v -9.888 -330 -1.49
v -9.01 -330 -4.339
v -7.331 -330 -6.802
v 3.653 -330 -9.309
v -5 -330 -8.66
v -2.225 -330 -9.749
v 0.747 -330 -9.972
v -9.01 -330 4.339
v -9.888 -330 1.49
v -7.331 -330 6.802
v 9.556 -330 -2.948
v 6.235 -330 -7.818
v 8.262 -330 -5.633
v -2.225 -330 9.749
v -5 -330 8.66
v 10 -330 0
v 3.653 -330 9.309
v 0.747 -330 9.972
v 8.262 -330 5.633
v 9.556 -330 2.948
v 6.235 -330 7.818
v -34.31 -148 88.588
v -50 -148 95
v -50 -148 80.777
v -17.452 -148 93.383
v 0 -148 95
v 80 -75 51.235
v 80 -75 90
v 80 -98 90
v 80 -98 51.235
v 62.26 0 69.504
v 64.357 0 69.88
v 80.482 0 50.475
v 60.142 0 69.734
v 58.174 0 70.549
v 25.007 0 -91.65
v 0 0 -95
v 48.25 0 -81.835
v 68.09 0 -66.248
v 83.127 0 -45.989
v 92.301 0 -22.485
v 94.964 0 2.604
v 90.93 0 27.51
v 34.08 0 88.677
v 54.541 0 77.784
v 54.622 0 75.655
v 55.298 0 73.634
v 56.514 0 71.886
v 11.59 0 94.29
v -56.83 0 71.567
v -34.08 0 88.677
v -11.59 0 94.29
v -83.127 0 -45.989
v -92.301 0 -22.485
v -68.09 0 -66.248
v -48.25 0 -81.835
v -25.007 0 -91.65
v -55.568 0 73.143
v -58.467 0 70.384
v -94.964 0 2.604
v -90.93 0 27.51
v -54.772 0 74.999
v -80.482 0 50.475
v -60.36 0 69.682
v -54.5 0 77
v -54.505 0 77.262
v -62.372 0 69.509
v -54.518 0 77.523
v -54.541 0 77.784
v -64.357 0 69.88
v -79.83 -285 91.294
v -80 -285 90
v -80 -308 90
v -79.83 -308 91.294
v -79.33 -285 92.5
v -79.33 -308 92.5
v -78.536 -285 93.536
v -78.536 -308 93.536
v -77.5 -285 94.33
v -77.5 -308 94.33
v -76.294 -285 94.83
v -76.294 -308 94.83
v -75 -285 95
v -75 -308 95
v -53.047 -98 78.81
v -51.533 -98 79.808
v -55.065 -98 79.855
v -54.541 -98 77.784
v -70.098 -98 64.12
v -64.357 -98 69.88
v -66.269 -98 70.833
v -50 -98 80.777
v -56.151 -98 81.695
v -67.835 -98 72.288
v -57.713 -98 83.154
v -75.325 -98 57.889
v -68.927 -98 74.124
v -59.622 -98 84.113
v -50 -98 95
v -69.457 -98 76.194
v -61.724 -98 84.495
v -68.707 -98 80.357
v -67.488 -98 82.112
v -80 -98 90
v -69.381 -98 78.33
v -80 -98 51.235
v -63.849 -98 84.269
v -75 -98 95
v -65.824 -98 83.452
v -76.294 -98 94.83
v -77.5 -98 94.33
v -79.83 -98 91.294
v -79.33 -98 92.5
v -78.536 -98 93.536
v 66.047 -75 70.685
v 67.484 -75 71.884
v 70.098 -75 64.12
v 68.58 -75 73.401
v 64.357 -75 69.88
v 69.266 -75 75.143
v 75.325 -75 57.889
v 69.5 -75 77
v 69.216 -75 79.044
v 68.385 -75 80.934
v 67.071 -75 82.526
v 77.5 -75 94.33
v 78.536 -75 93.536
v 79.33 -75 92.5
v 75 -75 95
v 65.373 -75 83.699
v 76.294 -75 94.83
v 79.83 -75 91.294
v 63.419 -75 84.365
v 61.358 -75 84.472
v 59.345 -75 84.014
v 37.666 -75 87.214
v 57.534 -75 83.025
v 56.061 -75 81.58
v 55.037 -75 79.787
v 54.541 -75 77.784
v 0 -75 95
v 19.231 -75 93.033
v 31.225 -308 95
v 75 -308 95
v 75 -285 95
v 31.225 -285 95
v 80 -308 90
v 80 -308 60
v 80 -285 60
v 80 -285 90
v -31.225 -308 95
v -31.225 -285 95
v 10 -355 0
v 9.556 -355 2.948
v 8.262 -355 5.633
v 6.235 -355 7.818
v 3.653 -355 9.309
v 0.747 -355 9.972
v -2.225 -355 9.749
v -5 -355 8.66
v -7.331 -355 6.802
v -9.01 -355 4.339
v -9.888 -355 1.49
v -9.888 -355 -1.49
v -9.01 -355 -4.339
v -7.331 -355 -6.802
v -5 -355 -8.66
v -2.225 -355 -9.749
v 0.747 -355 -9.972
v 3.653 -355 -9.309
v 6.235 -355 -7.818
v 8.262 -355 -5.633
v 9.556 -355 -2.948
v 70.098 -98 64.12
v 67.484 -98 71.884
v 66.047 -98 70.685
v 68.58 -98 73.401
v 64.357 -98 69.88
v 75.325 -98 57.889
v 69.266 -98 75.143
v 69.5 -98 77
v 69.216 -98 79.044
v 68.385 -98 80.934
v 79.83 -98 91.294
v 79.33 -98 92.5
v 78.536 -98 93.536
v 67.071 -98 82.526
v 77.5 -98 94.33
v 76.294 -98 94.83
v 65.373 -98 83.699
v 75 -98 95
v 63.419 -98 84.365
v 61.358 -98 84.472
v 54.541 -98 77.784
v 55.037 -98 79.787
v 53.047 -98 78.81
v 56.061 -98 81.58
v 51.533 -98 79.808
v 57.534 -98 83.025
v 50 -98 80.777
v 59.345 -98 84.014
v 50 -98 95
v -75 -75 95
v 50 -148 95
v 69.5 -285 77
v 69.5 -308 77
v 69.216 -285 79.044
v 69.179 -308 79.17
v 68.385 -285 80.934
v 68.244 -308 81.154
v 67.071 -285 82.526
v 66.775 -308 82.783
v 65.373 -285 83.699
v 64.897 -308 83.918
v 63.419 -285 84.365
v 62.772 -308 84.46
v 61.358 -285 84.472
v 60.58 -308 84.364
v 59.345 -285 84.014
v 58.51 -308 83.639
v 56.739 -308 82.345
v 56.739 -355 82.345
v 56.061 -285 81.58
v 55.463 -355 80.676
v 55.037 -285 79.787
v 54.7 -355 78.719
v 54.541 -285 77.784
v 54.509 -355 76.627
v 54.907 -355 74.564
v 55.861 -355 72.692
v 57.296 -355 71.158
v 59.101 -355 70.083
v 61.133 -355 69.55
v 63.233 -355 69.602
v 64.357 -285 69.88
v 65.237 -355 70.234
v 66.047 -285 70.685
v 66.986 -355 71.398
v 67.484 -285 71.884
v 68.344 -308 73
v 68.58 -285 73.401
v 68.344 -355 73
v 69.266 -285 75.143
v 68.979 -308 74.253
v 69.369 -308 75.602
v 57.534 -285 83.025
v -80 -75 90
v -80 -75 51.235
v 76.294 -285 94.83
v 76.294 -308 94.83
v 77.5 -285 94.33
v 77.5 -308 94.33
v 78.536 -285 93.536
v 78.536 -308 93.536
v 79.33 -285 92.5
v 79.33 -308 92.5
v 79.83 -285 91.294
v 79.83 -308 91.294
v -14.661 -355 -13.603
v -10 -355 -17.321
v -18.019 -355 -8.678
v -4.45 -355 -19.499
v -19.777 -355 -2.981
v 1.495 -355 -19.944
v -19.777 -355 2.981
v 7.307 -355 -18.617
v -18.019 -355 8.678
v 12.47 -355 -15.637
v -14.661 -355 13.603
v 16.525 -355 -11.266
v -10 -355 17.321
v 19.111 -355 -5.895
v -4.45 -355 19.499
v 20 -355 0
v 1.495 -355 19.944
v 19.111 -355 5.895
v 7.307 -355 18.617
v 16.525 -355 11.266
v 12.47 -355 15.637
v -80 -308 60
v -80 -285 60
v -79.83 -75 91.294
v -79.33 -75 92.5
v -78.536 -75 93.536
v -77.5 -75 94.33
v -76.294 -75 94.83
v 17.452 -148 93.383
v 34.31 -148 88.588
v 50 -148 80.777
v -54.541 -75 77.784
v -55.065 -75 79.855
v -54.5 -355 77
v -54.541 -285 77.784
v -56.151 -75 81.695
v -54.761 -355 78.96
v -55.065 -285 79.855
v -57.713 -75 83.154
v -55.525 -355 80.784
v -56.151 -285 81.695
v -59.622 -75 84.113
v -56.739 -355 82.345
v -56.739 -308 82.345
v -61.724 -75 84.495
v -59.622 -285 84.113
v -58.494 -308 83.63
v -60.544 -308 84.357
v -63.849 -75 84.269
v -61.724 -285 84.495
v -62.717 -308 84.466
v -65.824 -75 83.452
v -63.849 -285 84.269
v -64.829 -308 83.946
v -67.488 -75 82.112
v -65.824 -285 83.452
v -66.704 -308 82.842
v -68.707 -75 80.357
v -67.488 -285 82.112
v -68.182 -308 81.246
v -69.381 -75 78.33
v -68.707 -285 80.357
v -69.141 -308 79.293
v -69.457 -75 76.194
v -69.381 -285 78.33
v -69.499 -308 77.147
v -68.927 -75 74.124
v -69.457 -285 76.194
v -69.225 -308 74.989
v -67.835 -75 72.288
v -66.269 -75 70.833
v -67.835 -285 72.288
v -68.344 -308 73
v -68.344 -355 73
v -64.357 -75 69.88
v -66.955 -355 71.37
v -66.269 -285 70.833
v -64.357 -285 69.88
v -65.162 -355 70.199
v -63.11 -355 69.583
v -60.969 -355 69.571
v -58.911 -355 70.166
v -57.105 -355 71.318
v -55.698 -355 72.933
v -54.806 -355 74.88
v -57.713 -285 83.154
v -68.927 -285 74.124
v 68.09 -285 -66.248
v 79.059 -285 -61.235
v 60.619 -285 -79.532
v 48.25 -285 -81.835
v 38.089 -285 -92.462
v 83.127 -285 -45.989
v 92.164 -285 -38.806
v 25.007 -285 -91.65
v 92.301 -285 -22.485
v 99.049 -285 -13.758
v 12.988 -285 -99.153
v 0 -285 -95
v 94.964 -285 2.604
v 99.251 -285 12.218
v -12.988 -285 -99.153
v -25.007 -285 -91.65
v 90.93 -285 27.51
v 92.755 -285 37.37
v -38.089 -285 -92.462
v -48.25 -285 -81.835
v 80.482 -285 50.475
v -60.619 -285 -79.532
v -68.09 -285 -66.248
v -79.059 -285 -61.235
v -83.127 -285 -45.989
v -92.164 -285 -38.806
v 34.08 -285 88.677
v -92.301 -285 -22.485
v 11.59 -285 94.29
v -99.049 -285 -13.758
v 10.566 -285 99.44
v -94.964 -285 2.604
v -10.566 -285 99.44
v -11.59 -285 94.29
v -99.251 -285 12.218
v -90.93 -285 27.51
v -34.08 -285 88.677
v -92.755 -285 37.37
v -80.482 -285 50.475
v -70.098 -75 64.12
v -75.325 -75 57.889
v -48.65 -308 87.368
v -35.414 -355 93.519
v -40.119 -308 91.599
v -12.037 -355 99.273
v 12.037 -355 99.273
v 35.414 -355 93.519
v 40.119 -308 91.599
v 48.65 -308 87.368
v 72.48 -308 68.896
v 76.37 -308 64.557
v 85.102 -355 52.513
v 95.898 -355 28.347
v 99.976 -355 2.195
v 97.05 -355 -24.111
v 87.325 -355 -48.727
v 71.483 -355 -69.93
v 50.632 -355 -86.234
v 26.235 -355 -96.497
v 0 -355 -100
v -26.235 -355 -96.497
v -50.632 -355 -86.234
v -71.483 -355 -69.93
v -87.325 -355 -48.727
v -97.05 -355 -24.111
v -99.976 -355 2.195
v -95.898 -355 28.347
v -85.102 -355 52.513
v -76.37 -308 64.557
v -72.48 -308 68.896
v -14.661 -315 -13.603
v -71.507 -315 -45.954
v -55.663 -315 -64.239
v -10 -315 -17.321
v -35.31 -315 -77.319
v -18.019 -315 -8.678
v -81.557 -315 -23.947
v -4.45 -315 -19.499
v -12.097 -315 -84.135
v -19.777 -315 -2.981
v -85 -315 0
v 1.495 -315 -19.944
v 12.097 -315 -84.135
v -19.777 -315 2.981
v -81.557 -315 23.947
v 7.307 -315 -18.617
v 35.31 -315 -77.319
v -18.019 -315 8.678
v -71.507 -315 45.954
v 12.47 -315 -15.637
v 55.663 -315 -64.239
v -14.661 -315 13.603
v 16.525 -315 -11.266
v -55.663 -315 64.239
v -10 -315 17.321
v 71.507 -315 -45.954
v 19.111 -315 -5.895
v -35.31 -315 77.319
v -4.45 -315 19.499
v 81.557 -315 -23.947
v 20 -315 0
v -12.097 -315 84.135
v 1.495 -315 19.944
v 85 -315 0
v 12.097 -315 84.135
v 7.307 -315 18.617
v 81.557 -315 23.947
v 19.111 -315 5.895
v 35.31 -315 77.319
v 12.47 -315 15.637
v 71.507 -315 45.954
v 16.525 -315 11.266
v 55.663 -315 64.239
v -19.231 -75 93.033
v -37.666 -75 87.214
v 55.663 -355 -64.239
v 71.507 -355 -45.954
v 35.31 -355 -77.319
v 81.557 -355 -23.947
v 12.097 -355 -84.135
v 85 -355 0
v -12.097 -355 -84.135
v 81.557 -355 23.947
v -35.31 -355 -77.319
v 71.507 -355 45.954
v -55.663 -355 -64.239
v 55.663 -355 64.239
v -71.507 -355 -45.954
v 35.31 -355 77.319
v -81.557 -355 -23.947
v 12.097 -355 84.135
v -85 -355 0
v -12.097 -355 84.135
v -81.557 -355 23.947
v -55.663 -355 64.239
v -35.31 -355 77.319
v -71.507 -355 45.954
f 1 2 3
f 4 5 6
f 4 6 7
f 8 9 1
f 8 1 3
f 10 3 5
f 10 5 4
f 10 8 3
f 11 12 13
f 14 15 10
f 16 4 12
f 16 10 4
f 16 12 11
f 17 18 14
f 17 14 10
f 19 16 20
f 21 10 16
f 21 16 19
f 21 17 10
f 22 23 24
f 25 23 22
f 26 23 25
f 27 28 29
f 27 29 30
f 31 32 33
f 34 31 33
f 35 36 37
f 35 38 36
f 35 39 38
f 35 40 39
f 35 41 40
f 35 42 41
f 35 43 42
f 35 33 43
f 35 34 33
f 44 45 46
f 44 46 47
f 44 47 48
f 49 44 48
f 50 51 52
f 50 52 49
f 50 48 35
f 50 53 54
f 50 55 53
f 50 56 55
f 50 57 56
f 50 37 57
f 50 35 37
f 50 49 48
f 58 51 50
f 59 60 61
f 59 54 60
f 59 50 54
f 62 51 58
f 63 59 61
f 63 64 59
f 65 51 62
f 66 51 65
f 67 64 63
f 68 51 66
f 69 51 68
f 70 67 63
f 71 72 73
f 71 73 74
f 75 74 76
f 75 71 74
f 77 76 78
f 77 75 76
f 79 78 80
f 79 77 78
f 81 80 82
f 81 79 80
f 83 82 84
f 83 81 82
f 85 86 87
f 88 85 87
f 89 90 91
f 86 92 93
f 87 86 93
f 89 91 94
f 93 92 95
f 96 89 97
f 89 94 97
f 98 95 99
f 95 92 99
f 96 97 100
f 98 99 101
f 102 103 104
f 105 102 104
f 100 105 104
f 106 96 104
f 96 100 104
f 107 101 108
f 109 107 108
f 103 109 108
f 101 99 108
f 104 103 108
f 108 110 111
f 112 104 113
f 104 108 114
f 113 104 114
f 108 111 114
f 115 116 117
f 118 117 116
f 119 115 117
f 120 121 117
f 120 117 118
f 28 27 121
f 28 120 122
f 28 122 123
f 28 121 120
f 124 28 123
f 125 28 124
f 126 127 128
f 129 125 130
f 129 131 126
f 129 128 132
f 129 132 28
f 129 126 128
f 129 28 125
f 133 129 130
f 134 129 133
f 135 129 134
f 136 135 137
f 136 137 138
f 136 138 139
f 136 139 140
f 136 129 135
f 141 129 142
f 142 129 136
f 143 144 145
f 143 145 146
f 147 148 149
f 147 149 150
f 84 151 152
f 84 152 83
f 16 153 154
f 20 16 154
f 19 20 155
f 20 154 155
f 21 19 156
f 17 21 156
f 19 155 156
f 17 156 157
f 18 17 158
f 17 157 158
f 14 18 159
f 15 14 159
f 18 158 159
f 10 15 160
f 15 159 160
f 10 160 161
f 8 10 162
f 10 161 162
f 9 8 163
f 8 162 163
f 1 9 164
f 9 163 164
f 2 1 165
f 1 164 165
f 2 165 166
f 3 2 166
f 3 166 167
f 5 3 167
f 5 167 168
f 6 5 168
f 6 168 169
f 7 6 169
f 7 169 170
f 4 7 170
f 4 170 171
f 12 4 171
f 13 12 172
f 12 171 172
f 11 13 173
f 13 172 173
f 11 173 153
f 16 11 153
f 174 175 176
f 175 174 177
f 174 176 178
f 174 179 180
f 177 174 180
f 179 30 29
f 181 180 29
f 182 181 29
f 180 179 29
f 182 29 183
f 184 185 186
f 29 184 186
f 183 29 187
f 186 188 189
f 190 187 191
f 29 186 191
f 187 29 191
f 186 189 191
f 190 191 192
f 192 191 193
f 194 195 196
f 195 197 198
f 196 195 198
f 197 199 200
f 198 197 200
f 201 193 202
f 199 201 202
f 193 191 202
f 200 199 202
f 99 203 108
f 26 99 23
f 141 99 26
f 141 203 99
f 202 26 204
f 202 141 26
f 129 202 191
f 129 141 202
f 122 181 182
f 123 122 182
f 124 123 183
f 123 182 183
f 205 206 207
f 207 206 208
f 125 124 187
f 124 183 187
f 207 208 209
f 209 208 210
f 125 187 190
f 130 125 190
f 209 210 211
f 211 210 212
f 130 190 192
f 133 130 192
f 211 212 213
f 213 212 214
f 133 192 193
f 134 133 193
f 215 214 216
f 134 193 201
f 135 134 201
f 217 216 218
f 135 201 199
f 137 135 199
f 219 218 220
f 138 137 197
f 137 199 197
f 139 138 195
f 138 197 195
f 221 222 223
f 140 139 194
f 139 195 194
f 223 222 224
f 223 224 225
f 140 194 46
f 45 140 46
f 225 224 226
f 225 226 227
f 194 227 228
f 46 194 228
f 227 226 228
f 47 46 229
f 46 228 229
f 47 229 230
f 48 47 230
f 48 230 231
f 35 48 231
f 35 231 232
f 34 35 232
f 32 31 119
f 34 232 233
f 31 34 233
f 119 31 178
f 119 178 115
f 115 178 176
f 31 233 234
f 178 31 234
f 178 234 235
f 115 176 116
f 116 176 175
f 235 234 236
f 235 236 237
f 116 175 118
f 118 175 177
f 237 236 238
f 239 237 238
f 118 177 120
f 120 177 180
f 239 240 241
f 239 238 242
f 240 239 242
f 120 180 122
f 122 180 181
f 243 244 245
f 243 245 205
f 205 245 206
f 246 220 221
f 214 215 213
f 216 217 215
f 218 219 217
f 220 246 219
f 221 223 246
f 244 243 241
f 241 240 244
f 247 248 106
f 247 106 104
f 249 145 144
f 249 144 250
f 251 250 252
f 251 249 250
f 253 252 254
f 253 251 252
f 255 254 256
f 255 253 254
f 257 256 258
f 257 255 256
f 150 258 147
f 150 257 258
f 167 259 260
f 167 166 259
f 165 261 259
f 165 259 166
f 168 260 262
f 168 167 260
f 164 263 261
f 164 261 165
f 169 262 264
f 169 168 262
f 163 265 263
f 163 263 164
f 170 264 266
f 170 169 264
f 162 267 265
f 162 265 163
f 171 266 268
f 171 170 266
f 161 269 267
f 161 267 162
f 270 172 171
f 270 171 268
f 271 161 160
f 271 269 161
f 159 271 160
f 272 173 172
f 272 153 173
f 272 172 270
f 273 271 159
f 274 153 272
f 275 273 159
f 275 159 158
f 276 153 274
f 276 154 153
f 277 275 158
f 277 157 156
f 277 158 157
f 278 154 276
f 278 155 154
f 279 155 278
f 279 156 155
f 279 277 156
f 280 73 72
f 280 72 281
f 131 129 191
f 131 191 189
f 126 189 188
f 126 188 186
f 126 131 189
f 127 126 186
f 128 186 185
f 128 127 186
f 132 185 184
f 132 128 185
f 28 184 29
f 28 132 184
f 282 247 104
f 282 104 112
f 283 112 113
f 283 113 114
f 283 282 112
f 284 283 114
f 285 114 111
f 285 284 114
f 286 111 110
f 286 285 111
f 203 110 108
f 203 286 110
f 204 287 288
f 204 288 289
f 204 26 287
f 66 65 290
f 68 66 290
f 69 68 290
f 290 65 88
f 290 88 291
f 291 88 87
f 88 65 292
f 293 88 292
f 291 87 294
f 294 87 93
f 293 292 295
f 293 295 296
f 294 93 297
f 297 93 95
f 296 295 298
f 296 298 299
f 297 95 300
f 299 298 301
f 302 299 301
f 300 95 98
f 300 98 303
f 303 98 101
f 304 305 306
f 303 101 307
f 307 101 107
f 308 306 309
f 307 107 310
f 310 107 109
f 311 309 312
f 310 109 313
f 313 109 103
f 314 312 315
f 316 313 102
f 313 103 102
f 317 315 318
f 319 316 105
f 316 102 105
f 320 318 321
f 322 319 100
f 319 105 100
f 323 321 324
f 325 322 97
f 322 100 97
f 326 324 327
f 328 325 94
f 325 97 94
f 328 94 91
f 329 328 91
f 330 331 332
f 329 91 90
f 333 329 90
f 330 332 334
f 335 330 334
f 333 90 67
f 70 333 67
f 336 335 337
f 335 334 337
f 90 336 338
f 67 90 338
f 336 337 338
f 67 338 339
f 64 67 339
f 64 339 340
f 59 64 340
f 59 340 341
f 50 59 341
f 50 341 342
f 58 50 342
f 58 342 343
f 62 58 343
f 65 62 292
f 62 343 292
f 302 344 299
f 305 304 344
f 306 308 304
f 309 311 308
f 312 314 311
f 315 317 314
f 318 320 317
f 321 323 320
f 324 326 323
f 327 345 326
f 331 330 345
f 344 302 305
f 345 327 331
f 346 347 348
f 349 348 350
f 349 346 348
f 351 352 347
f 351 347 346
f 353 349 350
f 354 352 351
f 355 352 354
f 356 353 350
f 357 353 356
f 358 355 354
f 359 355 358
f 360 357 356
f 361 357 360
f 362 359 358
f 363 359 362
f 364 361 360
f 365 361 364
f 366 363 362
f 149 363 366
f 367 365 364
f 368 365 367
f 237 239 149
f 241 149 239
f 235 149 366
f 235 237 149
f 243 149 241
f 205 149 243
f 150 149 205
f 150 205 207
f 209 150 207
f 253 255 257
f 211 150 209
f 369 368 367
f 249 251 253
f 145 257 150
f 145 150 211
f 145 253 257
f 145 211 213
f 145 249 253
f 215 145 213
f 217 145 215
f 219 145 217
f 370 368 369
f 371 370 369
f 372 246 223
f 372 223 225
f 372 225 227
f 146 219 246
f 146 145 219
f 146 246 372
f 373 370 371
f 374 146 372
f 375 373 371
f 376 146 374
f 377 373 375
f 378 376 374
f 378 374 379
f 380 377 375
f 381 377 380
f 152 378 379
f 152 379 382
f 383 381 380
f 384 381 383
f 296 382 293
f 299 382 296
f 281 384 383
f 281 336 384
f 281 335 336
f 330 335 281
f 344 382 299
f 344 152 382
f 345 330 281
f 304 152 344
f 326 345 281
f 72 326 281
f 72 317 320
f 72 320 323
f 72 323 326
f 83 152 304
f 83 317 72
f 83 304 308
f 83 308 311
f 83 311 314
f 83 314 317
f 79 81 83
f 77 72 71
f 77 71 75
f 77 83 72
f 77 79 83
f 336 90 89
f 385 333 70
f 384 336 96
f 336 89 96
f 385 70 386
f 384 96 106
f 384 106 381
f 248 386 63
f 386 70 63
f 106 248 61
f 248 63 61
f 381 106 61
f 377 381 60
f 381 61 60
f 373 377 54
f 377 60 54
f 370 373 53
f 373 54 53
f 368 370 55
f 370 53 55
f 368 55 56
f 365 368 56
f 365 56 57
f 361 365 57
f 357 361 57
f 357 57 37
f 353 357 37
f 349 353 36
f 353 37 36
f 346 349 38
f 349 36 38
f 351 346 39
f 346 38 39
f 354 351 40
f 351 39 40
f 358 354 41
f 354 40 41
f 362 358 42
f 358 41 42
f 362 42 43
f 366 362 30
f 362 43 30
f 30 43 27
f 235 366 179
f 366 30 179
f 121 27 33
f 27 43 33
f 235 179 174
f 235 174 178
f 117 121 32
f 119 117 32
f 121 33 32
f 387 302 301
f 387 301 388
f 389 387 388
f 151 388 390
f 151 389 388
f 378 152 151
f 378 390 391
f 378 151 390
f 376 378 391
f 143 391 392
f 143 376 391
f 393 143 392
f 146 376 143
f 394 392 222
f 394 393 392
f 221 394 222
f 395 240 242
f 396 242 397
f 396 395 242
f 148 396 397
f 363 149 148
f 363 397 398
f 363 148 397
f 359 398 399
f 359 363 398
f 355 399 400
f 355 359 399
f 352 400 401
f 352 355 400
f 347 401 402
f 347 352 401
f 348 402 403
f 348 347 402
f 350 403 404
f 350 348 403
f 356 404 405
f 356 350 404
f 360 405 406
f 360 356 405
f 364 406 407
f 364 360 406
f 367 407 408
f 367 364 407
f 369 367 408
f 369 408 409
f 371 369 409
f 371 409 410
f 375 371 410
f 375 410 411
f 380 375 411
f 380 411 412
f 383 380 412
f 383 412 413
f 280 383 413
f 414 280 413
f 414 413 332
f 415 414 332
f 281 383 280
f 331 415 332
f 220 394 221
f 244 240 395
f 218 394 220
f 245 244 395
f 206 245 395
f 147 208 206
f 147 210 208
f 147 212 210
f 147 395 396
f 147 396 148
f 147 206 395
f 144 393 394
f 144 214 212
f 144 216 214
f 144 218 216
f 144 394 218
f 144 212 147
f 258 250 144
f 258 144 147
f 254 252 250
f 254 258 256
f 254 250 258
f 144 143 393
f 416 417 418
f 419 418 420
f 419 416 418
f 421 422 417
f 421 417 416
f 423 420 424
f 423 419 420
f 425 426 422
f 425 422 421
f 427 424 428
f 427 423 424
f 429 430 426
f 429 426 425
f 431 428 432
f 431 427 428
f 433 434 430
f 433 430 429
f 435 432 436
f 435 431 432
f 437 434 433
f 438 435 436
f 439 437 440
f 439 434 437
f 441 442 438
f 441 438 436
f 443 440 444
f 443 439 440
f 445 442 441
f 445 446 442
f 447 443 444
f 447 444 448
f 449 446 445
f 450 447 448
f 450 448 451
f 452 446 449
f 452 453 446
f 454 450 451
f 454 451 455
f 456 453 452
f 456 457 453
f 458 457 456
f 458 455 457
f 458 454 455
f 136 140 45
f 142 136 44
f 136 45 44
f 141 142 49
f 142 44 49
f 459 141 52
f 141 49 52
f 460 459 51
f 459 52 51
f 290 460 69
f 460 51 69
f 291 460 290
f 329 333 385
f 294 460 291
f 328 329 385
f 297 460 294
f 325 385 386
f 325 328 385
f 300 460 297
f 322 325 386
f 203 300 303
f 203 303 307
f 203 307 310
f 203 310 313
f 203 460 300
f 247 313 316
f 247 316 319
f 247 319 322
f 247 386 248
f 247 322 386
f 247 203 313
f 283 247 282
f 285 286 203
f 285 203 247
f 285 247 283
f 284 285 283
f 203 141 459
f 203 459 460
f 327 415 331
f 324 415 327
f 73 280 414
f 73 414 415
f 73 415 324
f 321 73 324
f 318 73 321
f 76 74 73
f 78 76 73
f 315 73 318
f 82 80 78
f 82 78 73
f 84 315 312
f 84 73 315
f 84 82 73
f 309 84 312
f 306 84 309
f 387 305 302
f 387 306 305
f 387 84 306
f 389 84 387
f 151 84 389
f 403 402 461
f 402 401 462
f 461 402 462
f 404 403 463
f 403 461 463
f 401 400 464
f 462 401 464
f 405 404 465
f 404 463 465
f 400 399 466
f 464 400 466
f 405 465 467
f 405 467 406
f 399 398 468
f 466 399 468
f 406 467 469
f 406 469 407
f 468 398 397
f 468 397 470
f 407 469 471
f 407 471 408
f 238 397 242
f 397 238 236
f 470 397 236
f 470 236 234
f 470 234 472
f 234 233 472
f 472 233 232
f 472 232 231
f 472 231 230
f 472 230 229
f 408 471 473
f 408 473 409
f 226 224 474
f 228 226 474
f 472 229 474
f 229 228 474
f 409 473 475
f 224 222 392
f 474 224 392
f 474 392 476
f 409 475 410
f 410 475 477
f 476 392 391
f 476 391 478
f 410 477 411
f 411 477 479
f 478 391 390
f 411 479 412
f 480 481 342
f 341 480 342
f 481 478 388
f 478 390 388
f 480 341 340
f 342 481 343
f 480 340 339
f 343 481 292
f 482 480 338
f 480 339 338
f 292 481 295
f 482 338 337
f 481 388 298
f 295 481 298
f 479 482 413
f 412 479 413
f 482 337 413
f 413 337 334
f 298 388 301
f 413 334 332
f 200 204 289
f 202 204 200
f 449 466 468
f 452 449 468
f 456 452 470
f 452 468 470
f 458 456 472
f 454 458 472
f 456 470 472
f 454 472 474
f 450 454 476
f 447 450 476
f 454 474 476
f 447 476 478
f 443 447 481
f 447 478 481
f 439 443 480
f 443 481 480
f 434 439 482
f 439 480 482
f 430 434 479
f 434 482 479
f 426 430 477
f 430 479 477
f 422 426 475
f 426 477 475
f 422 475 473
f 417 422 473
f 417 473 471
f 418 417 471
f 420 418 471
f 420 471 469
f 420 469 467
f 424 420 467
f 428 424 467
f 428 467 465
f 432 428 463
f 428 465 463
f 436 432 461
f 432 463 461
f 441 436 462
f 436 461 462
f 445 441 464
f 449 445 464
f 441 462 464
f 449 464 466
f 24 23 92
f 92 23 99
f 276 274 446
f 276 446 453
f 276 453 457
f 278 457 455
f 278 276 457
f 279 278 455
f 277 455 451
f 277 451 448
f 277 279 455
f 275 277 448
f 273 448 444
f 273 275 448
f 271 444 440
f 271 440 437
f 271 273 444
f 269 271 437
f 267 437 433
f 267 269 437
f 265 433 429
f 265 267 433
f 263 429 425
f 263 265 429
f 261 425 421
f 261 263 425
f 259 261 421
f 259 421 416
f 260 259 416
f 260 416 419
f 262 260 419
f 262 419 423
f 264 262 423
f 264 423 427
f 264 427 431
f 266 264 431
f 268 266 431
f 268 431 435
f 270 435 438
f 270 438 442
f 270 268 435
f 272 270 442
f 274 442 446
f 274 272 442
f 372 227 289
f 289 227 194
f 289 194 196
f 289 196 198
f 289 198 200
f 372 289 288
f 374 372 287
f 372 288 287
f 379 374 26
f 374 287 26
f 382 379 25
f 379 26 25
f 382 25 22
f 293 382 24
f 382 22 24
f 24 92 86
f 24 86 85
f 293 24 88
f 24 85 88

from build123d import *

# Parameters (mm, degrees)
F0_R      = 95
F1_DEPTH  = 355
F3_DEPTH  = 70
F4_R      = 85
F4_R_2    = 20
F5_DEPTH  = 40
F6_R      = 10
F7_DEPTH  = 25
F10_DEPTH = 98
F11_R     = 100
F11_R_2   = 95
F12_DEPTH = 70
F8_R      = 7.5
F13_DEPTH = 500
F14_R     = 5
F16_DEPTH = 47
F18_DEPTH = 75
F19_W     = 100
F19_H     = 50
F20_DEPTH = 22


# Not quite as in the source:
# - a feature names something its author has since deleted; it is built from what else it names


with BuildPart() as f1:
    # F0 (on Front) → F1 (new body)
    with BuildSketch(Plane.XZ):
        Circle(F0_R)
    extrude(amount=F1_DEPTH)

    # F2 (on face) → F3 (join)
    with BuildSketch(Plane.XZ.offset(355)):
        with BuildLine():
            Line((80, 51.2347538298), (80, 95))
            Line((80, 95), (46.4354390525, 95))
            Line((46.4354390525, 95), (0, 95))
            ThreePointArc((0, 95), (45.594398703, 83.3435708793), (80, 51.2347538298))
        make_face()
        with BuildLine():
            ThreePointArc((95, 0), (91.1729126441, 26.6926956301), (80, 51.2347538298))
            Line((80, 51.2347538298), (80, 50))
            Line((80, 50), (-80, 50))
            Line((-80, 50), (-80, 51.2347538298))
            ThreePointArc((-80, 51.2347538298), (-26.6926956301, -91.1729126441), (95, 0))
        make_face()
        with BuildLine():
            Line((80, 50), (80, 51.2347538298))
            ThreePointArc((80, 51.2347538298), (45.594398703, 83.3435708793), (0, 95))
            ThreePointArc((0, 95), (-45.594398703, 83.3435708793), (-80, 51.2347538298))
            Line((-80, 51.2347538298), (-80, 50))
            Line((-80, 50), (80, 50))
        make_face()
        with BuildLine():
            ThreePointArc((-80, 51.2347538298), (-45.594398703, 83.3435708793), (0, 95))
            Line((0, 95), (-46.4354390525, 95))
            Line((-46.4354390525, 95), (-80, 95))
            Line((-80, 95), (-80, 51.2347538298))
        make_face()
    extrude(amount=-F3_DEPTH)

    # F4 (on face) → F5 (cut)
    with BuildSketch(Plane.XZ.offset(355)):
        Circle(F4_R)
        Circle(F4_R_2, mode=Mode.SUBTRACT)
    extrude(amount=-F5_DEPTH, mode=Mode.SUBTRACT)

    # F6 (on face) → F7 (cut)
    with BuildSketch(Plane.XZ.offset(355)):
        Circle(F6_R)
    extrude(amount=-F7_DEPTH, mode=Mode.SUBTRACT)

    # F9 (on face) → F10 (join)
    with BuildSketch(Plane(origin=(0, 0, 0), x_dir=(-1, 0, 0), z_dir=(0, 1, 0))):
        with BuildLine():
            ThreePointArc((-80, 51.2347538298), (-45.594398703, 83.3435708793), (0, 95))
            Line((0, 95), (-75, 95))
            ThreePointArc((-75, 95), (-78.5355339059, 93.5355339059), (-80, 90))
            Line((-80, 90), (-80, 51.2347538298))
        make_face()
        with BuildLine():
            ThreePointArc((0, 95), (45.594398703, 83.3435708793), (80, 51.2347538298))
            Line((80, 51.2347538298), (80, 90))
            ThreePointArc((80, 90), (78.5355339059, 93.5355339059), (75, 95))
            Line((75, 95), (0, 95))
        make_face()
    extrude(amount=-F10_DEPTH)

    # F11 (on face) → F12 (join)
    with BuildSketch(Plane(origin=(0, -285, 0), x_dir=(-1, 0, 0), z_dir=(0, 1, 0))):
        Circle(F11_R)
        Circle(F11_R_2, mode=Mode.SUBTRACT)
    extrude(amount=-F12_DEPTH)

    # F8 (on face) → F13 (cut)
    with BuildSketch(Plane.XZ.offset(355)):
        with Locations((-62, 77)):
            Circle(F8_R)
        with Locations((62, 77)):
            Circle(F8_R)
    extrude(amount=-F13_DEPTH, mode=Mode.SUBTRACT)

    # F14
    f14_edges = [f1.edges().sort_by_distance(p)[0] for p in [
        (-80, -320, 95),
        (80, -320, 95),
    ]]
    fillet(f14_edges, radius=F14_R)

    # F15 (on face) → F16 (cut)
    with BuildSketch(Plane.XZ.offset(355)):
        with BuildLine():
            ThreePointArc((-80, 60), (0, 100), (80, 60))
            Line((80, 60), (80, 108.7283083646))
            Line((80, 108.7283083646), (-80, 108.7283083646))
            Line((-80, 108.7283083646), (-80, 60))
        make_face()
    extrude(amount=-F16_DEPTH, mode=Mode.SUBTRACT)

    # F17 (on face) → F18 (cut)
    with BuildSketch(Plane(origin=(0, 0, 0), x_dir=(-1, 0, 0), z_dir=(0, 1, 0))):
        with BuildLine():
            ThreePointArc((-80, 51.2347538298), (0, 95), (80, 51.2347538298))
            Line((80, 51.2347538298), (80, 103.6055907607))
            Line((80, 103.6055907607), (-80, 103.6055907607))
            Line((-80, 103.6055907607), (-80, 51.2347538298))
        make_face()
    extrude(amount=-F18_DEPTH, mode=Mode.SUBTRACT)

    # F19 (on face) → F20 (join)
    with BuildSketch(Plane.XY.offset(95)):
        with Locations((0, -123)):
            Rectangle(F19_W, F19_H)
    extrude(amount=-F20_DEPTH)


solid = f1.part
